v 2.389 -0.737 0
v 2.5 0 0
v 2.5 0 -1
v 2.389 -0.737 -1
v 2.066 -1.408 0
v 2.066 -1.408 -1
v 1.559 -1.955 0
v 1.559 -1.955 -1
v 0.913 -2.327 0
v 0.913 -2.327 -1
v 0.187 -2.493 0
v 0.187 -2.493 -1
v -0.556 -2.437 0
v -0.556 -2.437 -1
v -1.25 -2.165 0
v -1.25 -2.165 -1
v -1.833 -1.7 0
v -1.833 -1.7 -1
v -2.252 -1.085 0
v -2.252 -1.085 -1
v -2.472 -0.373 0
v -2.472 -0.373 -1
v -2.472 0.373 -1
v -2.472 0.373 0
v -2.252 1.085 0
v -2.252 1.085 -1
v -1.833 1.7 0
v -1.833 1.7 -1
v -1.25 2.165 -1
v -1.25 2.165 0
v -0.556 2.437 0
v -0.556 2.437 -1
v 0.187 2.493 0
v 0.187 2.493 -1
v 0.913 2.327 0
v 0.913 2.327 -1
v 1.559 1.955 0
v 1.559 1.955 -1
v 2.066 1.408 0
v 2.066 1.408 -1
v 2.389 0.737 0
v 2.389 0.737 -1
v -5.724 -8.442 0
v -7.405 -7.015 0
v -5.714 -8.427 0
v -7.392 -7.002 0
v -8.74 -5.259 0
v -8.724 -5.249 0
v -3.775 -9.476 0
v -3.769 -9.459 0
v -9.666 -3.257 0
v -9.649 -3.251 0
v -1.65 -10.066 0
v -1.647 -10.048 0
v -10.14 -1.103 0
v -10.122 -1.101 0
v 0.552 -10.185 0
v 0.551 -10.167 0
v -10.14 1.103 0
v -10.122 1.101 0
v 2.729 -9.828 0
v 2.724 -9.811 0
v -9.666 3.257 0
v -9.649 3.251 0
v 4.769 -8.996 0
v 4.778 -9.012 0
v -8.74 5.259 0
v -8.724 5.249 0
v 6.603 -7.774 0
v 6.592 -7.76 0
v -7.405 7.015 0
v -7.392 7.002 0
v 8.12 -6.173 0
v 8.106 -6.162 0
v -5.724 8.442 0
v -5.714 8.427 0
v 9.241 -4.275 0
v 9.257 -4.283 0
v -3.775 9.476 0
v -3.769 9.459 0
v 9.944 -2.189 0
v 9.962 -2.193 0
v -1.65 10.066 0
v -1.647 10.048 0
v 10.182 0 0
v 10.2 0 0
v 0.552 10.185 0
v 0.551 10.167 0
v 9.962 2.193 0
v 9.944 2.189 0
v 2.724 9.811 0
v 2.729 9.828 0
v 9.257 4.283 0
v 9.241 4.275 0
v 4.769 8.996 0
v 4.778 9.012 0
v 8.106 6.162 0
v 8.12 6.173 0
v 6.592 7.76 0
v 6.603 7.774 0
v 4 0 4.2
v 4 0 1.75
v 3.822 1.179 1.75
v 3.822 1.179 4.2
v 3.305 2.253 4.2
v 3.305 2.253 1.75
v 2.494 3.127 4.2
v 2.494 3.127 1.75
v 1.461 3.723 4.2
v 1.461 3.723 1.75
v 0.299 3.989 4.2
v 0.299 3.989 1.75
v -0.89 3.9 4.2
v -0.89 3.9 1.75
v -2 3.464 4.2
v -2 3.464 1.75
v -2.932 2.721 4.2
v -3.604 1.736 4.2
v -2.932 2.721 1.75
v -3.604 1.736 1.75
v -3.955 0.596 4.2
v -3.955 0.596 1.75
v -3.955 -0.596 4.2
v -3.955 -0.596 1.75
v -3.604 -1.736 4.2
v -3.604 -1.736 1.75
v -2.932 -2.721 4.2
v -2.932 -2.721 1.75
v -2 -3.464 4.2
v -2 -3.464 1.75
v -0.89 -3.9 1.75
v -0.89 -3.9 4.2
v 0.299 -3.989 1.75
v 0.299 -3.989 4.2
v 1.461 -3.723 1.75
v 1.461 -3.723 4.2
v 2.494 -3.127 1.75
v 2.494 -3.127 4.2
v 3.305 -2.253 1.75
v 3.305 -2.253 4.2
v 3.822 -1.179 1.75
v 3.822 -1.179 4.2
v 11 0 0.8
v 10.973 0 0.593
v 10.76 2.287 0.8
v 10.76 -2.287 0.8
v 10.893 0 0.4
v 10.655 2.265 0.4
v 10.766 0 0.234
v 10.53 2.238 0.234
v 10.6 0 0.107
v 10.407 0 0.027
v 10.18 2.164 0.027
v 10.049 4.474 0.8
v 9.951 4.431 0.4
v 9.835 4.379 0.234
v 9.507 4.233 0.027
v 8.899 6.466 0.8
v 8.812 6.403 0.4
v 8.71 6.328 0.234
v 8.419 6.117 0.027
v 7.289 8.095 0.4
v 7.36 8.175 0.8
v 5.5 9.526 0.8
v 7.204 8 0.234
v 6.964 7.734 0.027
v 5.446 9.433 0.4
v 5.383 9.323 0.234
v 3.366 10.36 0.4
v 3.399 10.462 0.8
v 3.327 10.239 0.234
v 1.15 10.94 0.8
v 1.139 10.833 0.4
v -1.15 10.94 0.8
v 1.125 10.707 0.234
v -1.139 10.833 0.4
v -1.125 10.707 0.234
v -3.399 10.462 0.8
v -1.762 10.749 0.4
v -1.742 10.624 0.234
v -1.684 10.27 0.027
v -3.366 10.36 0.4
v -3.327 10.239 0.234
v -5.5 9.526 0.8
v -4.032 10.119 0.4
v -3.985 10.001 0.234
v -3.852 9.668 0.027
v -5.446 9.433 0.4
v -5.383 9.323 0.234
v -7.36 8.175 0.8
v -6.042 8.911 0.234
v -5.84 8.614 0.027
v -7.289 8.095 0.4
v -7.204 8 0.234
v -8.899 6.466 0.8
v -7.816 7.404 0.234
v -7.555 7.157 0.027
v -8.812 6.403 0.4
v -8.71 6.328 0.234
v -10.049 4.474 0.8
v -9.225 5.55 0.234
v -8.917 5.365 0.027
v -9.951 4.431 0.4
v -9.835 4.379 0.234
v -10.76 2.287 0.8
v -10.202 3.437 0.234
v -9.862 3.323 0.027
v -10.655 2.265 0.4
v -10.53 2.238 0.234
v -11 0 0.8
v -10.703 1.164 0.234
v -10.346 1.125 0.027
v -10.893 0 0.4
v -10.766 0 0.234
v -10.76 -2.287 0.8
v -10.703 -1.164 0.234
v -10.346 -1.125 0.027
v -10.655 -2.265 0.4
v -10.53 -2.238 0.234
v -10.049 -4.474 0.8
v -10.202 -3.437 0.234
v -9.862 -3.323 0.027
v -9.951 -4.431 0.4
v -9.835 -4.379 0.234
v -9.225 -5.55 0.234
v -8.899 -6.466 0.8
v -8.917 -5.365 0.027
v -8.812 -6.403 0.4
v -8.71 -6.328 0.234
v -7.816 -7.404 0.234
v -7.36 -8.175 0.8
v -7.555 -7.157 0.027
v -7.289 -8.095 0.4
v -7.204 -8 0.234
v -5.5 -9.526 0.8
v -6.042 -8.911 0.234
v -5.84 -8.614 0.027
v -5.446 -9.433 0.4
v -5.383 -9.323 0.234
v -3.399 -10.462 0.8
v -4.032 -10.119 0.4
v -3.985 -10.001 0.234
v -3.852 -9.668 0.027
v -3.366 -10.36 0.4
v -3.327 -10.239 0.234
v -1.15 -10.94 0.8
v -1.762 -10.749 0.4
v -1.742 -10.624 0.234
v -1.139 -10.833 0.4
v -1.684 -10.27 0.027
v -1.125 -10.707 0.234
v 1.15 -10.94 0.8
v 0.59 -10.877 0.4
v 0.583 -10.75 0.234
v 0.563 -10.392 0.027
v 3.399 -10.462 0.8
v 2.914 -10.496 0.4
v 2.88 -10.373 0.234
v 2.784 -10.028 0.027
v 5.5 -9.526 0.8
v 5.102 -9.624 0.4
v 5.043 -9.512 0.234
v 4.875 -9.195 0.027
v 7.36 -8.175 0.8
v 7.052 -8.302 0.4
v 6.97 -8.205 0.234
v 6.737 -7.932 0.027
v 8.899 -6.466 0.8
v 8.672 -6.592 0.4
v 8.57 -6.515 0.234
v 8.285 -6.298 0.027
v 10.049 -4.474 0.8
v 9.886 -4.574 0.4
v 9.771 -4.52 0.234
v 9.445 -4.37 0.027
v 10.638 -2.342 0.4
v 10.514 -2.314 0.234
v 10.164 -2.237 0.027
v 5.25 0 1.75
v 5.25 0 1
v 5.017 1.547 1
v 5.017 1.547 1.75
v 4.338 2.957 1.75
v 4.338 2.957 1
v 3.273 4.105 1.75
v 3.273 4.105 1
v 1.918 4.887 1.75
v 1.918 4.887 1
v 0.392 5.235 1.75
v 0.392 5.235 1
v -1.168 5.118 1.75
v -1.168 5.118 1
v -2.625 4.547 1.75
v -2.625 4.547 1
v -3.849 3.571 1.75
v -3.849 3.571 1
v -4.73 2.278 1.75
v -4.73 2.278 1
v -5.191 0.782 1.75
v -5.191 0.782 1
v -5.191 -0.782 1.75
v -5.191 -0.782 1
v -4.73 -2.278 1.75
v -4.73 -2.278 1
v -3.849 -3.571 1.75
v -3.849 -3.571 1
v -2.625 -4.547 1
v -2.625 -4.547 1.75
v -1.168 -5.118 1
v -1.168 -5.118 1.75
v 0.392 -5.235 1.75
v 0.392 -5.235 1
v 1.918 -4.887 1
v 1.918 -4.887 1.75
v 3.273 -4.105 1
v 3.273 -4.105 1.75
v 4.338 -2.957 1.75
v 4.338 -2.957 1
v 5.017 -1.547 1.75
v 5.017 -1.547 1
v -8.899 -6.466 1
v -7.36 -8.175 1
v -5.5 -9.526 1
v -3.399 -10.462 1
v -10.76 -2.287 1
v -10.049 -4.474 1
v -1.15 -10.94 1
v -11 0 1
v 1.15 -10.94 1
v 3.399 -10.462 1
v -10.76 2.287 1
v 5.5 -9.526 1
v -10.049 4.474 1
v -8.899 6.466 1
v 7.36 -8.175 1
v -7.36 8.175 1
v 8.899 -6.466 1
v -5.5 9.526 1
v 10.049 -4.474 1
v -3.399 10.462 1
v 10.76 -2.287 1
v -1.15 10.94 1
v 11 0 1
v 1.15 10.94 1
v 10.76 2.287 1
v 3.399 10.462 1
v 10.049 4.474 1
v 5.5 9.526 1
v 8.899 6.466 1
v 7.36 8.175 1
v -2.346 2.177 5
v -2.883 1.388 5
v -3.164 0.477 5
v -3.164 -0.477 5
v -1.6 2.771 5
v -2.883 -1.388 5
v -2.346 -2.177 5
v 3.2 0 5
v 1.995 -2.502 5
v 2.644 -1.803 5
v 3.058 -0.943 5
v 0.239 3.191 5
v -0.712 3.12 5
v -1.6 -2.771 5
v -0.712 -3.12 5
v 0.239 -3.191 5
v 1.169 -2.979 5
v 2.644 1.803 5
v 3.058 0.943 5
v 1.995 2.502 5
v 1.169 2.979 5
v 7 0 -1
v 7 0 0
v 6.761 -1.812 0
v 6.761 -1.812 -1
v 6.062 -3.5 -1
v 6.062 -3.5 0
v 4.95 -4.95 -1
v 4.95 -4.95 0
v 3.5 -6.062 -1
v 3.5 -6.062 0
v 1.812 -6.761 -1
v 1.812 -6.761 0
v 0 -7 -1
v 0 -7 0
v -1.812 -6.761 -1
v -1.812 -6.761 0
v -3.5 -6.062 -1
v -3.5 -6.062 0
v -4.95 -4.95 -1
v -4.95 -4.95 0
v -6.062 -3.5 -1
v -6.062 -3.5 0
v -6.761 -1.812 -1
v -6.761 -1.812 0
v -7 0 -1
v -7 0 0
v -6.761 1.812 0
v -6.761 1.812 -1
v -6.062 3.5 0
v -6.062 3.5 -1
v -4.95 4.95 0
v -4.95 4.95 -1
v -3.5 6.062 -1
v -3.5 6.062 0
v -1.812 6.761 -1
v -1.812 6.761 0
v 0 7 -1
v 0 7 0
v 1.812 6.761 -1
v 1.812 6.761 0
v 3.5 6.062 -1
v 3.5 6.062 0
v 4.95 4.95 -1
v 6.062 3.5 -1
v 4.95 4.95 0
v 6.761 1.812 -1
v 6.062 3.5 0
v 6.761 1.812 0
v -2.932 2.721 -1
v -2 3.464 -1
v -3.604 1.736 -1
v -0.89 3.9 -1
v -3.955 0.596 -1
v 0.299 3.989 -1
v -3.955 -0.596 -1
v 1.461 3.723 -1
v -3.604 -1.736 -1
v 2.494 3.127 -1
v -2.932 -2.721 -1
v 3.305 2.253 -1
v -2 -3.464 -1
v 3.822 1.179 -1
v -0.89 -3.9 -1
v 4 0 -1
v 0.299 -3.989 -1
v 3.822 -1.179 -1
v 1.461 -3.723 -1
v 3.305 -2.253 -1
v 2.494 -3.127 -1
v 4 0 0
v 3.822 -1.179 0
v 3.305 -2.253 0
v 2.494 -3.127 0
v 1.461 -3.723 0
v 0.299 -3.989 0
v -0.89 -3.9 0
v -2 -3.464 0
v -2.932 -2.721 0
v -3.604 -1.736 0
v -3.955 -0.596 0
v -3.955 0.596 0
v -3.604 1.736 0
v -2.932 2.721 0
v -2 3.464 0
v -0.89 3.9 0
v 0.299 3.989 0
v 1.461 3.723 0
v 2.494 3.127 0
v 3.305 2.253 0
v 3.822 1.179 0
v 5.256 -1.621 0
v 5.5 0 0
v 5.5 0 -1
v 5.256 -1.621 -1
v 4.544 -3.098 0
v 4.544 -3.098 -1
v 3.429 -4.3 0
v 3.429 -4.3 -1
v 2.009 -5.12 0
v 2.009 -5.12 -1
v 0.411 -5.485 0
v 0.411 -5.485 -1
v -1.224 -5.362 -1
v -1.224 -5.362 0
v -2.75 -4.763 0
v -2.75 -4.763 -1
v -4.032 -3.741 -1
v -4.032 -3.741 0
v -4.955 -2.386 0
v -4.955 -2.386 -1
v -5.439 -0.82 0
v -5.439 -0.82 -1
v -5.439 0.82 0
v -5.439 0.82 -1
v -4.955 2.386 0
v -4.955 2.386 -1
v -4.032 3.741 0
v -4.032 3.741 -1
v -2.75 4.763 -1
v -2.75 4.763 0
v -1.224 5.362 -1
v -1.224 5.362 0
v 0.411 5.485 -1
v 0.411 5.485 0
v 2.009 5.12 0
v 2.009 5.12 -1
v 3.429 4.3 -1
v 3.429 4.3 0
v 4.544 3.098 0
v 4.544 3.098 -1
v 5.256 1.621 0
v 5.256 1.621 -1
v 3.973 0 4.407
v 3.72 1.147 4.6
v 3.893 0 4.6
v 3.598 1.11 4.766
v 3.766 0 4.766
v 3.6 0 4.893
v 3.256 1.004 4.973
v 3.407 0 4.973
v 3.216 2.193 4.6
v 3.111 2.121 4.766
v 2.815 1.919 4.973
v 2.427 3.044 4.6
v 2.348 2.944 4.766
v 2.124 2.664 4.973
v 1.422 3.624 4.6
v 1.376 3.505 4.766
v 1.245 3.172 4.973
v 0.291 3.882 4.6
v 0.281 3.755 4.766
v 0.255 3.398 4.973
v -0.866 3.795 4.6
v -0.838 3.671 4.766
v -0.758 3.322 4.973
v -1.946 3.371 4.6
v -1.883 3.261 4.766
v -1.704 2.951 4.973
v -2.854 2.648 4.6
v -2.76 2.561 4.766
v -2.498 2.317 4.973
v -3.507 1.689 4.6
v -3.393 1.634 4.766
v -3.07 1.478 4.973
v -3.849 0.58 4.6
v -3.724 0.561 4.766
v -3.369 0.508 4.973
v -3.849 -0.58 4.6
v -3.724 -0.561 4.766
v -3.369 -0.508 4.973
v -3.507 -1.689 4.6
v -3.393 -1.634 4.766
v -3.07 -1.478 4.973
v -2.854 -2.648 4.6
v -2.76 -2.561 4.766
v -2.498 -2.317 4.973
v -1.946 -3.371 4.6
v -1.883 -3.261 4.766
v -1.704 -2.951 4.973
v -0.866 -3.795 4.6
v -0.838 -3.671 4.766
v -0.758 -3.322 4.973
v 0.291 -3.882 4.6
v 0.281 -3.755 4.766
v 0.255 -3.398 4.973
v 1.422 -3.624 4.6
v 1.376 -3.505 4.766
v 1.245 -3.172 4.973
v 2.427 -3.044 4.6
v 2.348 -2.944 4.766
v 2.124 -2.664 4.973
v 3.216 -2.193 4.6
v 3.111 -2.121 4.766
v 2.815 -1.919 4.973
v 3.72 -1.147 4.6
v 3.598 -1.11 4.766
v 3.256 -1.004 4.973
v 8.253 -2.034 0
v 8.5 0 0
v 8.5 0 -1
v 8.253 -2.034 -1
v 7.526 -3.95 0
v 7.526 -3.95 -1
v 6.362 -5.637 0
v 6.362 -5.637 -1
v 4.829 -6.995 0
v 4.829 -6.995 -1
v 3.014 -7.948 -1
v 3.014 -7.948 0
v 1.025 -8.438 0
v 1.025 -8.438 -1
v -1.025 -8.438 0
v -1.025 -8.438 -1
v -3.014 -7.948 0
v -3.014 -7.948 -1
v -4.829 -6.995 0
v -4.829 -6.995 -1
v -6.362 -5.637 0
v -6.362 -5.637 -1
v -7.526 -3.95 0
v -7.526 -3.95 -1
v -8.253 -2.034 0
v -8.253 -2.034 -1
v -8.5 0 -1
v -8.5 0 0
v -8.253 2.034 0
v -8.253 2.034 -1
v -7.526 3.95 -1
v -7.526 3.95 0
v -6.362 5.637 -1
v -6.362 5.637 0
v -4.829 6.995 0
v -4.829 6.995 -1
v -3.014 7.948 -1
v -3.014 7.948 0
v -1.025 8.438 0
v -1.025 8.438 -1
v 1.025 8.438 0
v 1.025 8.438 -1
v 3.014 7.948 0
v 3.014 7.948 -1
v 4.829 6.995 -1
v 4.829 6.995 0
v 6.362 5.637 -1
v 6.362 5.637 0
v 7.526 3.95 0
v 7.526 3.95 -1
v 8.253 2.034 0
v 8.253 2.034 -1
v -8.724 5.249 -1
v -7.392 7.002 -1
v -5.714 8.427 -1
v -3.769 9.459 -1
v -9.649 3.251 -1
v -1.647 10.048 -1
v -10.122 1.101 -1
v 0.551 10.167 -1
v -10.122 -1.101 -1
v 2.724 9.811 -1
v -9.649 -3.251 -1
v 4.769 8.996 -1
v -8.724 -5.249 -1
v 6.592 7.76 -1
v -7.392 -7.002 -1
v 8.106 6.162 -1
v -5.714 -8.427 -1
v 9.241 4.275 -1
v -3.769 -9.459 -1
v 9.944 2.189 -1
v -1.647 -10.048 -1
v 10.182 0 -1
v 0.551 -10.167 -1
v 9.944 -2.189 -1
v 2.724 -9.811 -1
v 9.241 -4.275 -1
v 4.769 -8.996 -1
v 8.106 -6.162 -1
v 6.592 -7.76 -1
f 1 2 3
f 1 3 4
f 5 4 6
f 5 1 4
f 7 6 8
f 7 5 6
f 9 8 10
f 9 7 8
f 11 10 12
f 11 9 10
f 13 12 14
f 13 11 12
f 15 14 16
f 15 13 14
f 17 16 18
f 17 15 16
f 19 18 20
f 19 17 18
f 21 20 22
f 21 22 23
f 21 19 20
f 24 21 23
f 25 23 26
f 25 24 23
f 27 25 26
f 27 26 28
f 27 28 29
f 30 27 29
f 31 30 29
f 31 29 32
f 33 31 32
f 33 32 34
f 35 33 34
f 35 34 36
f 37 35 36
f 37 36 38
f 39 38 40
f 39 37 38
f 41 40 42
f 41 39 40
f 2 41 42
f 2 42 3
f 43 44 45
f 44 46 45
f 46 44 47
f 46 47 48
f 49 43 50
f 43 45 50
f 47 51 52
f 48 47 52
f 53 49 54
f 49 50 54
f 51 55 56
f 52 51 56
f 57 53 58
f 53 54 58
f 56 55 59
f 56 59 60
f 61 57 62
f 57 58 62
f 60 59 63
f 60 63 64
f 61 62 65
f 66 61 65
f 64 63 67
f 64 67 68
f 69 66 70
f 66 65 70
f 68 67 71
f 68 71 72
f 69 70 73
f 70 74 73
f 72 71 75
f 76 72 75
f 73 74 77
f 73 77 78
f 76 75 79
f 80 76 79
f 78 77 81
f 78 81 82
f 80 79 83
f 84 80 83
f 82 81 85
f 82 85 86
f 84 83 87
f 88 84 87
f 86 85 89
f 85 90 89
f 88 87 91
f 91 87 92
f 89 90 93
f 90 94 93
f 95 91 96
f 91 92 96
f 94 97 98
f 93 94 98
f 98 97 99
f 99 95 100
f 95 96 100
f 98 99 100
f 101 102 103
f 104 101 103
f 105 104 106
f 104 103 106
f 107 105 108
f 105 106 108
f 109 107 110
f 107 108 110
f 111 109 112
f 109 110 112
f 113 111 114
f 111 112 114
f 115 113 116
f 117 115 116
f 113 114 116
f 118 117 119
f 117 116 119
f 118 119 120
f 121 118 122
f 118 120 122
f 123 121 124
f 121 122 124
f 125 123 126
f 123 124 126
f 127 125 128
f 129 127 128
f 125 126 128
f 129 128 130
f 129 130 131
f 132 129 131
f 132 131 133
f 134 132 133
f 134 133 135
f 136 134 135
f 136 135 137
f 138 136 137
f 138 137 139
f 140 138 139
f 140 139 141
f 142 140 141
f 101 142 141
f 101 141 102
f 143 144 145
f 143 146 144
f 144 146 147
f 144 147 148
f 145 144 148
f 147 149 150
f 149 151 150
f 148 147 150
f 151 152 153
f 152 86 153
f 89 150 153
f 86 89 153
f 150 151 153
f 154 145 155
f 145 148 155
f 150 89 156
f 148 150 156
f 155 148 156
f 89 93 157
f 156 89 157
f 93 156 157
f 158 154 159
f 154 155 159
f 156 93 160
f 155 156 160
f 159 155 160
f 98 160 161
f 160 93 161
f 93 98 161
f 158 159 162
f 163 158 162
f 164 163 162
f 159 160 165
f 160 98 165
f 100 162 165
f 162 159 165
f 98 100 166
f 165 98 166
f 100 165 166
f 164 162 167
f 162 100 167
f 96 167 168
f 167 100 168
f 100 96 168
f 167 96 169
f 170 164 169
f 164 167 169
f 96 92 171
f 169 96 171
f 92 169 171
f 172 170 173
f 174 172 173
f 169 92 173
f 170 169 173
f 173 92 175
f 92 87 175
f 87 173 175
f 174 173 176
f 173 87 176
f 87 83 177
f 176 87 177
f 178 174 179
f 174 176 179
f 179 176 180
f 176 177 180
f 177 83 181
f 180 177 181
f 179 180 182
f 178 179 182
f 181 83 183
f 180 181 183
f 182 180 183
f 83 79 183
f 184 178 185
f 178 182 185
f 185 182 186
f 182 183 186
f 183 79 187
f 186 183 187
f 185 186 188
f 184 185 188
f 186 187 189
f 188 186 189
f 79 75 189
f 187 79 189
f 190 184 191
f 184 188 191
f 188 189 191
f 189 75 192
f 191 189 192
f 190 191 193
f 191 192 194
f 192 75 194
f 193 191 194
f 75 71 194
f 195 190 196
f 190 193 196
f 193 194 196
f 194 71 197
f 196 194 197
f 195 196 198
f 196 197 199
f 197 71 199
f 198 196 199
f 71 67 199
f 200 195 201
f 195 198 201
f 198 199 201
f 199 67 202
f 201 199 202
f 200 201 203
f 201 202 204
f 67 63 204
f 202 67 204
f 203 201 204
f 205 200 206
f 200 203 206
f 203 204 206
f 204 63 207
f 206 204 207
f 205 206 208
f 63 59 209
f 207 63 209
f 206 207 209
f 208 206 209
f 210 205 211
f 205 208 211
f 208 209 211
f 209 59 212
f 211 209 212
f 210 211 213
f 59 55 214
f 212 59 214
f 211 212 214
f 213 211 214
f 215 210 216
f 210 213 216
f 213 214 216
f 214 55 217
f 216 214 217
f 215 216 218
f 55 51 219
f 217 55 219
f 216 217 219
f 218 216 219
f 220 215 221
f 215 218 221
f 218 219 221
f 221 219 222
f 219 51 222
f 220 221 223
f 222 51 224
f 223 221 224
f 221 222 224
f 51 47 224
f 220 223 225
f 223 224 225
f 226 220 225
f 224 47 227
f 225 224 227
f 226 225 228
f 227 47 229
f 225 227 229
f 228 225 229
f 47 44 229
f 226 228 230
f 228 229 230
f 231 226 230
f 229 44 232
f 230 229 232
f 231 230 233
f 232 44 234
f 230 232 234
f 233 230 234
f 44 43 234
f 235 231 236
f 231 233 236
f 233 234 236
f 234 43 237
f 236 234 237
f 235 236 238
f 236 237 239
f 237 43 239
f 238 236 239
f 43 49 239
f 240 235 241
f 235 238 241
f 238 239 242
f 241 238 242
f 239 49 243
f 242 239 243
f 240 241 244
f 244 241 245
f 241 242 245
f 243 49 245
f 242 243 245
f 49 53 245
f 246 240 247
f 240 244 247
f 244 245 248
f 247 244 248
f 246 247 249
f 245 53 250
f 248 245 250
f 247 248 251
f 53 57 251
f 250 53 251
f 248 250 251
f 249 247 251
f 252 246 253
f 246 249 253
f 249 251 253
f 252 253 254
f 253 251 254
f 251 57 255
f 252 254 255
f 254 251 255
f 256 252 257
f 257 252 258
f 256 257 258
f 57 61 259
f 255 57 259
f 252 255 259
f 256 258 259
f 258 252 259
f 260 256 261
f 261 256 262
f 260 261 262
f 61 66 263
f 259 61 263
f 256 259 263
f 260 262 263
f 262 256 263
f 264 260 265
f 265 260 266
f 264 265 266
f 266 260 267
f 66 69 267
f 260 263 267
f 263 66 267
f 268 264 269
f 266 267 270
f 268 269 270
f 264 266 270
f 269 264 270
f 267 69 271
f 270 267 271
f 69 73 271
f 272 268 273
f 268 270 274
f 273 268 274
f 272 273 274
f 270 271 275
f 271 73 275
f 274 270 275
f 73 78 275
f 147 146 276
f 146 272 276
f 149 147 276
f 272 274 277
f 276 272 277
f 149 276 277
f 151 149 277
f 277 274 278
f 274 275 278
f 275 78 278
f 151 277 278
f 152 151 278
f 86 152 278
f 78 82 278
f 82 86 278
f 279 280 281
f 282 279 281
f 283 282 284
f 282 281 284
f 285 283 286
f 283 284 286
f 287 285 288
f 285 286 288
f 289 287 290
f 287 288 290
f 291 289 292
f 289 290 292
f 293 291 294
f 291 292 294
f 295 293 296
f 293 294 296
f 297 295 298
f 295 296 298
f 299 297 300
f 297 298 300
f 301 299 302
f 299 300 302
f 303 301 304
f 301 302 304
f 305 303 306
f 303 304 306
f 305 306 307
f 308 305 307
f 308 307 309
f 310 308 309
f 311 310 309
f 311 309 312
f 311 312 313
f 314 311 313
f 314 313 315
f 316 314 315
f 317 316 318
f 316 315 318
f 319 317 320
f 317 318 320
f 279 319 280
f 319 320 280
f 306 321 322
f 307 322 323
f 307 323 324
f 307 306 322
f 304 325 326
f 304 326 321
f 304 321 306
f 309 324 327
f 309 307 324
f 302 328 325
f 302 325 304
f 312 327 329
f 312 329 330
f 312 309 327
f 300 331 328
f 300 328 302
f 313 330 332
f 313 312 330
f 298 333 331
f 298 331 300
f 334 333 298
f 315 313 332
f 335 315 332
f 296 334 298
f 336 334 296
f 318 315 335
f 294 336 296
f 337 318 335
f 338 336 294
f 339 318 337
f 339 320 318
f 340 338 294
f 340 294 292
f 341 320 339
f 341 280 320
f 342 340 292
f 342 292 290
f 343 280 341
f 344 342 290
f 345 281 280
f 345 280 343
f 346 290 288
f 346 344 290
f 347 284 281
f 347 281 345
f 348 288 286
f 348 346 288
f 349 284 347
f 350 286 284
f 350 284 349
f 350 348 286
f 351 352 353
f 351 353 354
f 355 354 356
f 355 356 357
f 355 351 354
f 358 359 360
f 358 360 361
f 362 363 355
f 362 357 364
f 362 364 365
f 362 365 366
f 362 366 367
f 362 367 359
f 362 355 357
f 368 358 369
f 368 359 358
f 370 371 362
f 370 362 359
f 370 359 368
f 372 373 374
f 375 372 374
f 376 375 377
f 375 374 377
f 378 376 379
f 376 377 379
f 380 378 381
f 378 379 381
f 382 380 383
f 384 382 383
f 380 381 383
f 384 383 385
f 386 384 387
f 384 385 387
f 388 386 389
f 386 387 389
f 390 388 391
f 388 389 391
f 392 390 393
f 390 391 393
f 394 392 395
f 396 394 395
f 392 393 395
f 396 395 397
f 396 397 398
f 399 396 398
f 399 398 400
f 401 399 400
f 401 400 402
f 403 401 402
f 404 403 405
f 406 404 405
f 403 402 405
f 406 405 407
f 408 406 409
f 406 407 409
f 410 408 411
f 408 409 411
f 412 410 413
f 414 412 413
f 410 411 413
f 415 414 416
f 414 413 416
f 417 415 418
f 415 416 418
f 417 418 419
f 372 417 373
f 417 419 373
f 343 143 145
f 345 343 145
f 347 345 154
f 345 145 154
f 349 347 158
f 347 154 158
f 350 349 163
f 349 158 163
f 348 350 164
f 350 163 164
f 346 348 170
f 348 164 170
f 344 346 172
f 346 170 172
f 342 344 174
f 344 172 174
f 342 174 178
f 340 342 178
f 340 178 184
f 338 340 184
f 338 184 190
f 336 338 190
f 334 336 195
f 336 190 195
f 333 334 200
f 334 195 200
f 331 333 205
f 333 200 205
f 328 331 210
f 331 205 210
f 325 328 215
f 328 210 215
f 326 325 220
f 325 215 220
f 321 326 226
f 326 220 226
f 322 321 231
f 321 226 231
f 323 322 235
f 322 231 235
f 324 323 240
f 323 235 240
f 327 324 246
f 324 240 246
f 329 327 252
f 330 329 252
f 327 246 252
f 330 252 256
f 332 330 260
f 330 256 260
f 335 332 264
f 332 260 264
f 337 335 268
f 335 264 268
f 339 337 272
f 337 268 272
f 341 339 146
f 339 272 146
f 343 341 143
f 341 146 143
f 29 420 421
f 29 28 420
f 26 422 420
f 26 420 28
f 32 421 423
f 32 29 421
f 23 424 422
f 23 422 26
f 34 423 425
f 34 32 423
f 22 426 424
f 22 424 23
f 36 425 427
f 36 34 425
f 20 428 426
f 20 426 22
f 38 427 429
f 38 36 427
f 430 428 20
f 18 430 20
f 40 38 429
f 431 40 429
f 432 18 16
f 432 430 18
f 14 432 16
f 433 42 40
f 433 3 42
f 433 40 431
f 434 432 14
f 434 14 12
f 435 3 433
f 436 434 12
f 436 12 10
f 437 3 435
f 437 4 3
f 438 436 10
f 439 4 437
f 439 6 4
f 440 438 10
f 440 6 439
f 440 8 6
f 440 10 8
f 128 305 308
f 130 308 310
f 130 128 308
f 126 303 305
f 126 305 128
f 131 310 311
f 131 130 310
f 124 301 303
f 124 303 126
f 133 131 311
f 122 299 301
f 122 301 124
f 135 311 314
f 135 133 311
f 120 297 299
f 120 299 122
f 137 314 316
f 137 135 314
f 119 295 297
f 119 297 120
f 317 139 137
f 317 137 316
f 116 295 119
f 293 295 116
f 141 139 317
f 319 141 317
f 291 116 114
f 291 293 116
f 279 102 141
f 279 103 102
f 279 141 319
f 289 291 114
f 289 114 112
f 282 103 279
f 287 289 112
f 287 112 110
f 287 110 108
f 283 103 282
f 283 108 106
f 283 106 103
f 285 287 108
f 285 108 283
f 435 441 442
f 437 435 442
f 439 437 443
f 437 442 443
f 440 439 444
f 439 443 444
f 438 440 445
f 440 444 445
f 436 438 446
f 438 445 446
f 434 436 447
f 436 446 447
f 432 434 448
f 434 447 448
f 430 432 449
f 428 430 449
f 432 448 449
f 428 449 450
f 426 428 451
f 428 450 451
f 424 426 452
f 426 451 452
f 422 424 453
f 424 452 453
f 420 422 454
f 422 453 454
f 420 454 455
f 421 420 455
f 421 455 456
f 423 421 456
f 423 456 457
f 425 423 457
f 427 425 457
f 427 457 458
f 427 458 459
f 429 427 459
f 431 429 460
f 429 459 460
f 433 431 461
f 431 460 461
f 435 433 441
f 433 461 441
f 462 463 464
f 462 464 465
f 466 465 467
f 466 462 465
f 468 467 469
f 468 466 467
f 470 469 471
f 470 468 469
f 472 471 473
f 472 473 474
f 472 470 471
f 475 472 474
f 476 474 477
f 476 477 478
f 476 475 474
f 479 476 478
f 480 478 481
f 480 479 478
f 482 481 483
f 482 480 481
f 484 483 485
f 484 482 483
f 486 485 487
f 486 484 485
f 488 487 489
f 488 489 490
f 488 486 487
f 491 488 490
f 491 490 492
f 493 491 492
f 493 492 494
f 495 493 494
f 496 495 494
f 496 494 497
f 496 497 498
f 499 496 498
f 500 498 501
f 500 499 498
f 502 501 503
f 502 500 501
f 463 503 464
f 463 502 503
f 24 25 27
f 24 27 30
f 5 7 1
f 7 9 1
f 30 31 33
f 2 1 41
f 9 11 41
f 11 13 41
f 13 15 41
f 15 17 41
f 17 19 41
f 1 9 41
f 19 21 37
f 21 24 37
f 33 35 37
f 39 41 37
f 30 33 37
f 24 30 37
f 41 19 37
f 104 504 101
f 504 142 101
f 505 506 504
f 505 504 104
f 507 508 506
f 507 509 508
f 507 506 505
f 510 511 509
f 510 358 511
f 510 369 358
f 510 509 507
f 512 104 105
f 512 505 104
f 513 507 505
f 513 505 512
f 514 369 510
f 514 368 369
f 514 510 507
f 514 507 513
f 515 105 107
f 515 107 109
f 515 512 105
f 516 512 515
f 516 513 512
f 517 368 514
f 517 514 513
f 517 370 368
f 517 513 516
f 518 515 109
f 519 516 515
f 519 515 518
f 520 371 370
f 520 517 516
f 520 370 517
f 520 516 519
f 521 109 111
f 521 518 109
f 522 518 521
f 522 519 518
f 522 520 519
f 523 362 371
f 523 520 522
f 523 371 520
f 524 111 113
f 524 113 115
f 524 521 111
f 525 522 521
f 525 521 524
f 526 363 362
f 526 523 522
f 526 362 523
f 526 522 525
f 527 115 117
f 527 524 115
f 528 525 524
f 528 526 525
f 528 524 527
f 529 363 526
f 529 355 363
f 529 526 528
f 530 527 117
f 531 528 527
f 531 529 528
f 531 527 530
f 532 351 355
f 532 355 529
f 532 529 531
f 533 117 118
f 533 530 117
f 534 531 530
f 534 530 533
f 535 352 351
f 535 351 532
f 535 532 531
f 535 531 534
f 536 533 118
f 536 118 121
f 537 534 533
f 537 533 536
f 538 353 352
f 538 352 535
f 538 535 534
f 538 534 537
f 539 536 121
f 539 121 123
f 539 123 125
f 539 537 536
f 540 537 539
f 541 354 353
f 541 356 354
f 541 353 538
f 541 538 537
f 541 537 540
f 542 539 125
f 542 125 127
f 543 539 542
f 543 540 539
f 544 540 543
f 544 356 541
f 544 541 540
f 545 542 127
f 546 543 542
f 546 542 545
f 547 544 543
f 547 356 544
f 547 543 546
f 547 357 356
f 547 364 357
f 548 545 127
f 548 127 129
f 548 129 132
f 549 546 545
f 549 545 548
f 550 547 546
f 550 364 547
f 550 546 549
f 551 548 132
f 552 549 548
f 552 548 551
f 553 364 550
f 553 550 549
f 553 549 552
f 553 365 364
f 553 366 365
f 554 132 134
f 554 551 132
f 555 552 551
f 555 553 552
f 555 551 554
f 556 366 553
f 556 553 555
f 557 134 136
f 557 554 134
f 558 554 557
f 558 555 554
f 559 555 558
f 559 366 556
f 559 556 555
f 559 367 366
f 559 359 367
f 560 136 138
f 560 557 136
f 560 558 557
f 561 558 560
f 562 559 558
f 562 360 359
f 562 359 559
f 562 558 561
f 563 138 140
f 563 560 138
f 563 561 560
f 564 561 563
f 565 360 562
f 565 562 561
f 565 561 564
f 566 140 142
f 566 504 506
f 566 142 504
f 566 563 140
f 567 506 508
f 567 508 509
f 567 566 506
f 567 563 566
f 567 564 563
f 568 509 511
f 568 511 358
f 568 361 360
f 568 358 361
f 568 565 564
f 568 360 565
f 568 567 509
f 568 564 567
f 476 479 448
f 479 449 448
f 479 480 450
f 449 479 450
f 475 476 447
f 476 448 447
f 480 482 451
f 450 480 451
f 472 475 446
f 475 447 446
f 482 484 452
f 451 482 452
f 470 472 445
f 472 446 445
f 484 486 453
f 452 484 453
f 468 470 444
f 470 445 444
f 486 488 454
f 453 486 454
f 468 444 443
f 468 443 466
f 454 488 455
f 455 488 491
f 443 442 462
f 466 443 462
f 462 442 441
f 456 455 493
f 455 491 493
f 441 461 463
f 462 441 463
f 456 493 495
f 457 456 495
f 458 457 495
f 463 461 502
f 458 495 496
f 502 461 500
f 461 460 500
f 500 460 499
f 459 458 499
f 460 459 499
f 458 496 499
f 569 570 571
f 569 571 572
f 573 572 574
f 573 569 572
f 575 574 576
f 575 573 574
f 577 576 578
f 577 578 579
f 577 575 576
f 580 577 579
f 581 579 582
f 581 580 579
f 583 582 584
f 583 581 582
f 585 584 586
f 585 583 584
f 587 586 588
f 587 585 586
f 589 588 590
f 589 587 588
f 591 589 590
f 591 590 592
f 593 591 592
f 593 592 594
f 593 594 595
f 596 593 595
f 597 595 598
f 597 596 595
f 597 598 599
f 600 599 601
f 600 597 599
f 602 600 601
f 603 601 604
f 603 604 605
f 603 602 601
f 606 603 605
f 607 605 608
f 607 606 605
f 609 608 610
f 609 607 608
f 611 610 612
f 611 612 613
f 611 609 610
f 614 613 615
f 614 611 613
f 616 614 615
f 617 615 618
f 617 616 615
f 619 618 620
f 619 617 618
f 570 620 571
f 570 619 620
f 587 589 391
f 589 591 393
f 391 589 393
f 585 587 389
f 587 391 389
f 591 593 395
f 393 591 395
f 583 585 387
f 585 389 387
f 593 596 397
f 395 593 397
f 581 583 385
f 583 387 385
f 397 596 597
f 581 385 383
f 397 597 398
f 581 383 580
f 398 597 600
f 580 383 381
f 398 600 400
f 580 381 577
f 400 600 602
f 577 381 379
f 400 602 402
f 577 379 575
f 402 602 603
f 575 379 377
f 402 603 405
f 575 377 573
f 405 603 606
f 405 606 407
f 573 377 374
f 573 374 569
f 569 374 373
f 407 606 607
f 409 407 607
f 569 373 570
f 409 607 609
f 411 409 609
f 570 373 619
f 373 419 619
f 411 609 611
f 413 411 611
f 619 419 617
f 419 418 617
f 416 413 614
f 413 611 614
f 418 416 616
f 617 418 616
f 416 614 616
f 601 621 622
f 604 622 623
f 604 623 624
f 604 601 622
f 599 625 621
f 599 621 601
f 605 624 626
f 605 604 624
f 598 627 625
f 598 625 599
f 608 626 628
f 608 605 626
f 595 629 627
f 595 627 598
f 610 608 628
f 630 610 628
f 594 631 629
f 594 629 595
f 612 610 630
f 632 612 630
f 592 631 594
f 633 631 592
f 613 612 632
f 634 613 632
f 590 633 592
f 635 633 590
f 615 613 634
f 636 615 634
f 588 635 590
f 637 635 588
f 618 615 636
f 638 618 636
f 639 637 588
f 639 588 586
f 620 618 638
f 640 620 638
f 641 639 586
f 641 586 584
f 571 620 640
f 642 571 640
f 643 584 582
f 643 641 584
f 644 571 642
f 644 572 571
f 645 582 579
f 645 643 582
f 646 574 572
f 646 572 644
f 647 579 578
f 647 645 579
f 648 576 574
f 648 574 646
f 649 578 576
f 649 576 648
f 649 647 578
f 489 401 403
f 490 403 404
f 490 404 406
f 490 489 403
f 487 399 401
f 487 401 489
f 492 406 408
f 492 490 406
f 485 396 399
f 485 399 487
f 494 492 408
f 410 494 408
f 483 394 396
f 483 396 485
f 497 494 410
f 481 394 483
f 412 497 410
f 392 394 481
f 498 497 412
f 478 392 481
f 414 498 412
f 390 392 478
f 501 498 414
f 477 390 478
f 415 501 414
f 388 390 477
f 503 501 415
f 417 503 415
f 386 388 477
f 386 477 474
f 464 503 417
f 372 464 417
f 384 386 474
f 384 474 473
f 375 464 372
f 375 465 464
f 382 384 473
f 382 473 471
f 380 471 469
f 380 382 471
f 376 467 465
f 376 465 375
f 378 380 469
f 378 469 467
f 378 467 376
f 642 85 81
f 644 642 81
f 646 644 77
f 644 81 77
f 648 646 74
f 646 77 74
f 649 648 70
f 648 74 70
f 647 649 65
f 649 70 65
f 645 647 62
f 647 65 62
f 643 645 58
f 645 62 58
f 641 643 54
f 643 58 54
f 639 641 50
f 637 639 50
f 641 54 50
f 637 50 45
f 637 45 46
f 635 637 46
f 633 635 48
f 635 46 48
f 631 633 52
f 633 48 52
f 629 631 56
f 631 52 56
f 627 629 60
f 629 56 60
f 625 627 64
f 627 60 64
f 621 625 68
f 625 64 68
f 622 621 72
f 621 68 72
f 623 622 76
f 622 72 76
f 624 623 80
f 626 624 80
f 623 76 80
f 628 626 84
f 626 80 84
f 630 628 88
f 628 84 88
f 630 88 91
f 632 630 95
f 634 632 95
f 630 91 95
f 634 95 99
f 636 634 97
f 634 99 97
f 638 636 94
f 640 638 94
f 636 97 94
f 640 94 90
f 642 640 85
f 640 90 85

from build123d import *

# Parameters (mm, degrees)
F0_R     = 11
F1_DEPTH = 1
F2_R     = 4
F3_DEPTH = 4
F4_R     = 0.8
F5_R     = 5.25
F5_R_2   = 4
F6_DEPTH = 0.75
F7_R     = 10.1819626288
F7_R_2   = 8.5
F7_R_3   = 7
F7_R_4   = 5.5
F7_R_5   = 4
F7_R_6   = 2.5
F8_DEPTH = 1


with BuildPart() as f1:
    # F0 (on Top) → F1 (new body)
    with BuildSketch(Plane.XY):
        Circle(F0_R)
    extrude(amount=F1_DEPTH)

    # F2 (on face) → F3 (join)
    with BuildSketch(Plane.XY.offset(1)):
        Circle(F2_R)
    extrude(amount=F3_DEPTH)

    # F4
    f4_edges = [f1.edges().sort_by_distance(p)[0] for p in [
        (-11, 0, 0),
        (-4, 0, 5),
    ]]
    fillet(f4_edges, radius=F4_R)

    # F5 (on face) → F6 (join)
    with BuildSketch(Plane.XY.offset(1)):
        Circle(F5_R)
        Circle(F5_R_2, mode=Mode.SUBTRACT)
        Circle(F5_R_2)
    extrude(amount=F6_DEPTH)

    # F7 (on face) → F8 (join)
    with BuildSketch(Plane(origin=(0, 0, 0), x_dir=(1, 0, 0), z_dir=(0, 0, -1))):
        Circle(F7_R)
        Circle(F7_R_2, mode=Mode.SUBTRACT)
        Circle(F7_R_3)
        Circle(F7_R_4, mode=Mode.SUBTRACT)
        Circle(F7_R_5)
        Circle(F7_R_6, mode=Mode.SUBTRACT)
    extrude(amount=F8_DEPTH)


solid = f1.part
